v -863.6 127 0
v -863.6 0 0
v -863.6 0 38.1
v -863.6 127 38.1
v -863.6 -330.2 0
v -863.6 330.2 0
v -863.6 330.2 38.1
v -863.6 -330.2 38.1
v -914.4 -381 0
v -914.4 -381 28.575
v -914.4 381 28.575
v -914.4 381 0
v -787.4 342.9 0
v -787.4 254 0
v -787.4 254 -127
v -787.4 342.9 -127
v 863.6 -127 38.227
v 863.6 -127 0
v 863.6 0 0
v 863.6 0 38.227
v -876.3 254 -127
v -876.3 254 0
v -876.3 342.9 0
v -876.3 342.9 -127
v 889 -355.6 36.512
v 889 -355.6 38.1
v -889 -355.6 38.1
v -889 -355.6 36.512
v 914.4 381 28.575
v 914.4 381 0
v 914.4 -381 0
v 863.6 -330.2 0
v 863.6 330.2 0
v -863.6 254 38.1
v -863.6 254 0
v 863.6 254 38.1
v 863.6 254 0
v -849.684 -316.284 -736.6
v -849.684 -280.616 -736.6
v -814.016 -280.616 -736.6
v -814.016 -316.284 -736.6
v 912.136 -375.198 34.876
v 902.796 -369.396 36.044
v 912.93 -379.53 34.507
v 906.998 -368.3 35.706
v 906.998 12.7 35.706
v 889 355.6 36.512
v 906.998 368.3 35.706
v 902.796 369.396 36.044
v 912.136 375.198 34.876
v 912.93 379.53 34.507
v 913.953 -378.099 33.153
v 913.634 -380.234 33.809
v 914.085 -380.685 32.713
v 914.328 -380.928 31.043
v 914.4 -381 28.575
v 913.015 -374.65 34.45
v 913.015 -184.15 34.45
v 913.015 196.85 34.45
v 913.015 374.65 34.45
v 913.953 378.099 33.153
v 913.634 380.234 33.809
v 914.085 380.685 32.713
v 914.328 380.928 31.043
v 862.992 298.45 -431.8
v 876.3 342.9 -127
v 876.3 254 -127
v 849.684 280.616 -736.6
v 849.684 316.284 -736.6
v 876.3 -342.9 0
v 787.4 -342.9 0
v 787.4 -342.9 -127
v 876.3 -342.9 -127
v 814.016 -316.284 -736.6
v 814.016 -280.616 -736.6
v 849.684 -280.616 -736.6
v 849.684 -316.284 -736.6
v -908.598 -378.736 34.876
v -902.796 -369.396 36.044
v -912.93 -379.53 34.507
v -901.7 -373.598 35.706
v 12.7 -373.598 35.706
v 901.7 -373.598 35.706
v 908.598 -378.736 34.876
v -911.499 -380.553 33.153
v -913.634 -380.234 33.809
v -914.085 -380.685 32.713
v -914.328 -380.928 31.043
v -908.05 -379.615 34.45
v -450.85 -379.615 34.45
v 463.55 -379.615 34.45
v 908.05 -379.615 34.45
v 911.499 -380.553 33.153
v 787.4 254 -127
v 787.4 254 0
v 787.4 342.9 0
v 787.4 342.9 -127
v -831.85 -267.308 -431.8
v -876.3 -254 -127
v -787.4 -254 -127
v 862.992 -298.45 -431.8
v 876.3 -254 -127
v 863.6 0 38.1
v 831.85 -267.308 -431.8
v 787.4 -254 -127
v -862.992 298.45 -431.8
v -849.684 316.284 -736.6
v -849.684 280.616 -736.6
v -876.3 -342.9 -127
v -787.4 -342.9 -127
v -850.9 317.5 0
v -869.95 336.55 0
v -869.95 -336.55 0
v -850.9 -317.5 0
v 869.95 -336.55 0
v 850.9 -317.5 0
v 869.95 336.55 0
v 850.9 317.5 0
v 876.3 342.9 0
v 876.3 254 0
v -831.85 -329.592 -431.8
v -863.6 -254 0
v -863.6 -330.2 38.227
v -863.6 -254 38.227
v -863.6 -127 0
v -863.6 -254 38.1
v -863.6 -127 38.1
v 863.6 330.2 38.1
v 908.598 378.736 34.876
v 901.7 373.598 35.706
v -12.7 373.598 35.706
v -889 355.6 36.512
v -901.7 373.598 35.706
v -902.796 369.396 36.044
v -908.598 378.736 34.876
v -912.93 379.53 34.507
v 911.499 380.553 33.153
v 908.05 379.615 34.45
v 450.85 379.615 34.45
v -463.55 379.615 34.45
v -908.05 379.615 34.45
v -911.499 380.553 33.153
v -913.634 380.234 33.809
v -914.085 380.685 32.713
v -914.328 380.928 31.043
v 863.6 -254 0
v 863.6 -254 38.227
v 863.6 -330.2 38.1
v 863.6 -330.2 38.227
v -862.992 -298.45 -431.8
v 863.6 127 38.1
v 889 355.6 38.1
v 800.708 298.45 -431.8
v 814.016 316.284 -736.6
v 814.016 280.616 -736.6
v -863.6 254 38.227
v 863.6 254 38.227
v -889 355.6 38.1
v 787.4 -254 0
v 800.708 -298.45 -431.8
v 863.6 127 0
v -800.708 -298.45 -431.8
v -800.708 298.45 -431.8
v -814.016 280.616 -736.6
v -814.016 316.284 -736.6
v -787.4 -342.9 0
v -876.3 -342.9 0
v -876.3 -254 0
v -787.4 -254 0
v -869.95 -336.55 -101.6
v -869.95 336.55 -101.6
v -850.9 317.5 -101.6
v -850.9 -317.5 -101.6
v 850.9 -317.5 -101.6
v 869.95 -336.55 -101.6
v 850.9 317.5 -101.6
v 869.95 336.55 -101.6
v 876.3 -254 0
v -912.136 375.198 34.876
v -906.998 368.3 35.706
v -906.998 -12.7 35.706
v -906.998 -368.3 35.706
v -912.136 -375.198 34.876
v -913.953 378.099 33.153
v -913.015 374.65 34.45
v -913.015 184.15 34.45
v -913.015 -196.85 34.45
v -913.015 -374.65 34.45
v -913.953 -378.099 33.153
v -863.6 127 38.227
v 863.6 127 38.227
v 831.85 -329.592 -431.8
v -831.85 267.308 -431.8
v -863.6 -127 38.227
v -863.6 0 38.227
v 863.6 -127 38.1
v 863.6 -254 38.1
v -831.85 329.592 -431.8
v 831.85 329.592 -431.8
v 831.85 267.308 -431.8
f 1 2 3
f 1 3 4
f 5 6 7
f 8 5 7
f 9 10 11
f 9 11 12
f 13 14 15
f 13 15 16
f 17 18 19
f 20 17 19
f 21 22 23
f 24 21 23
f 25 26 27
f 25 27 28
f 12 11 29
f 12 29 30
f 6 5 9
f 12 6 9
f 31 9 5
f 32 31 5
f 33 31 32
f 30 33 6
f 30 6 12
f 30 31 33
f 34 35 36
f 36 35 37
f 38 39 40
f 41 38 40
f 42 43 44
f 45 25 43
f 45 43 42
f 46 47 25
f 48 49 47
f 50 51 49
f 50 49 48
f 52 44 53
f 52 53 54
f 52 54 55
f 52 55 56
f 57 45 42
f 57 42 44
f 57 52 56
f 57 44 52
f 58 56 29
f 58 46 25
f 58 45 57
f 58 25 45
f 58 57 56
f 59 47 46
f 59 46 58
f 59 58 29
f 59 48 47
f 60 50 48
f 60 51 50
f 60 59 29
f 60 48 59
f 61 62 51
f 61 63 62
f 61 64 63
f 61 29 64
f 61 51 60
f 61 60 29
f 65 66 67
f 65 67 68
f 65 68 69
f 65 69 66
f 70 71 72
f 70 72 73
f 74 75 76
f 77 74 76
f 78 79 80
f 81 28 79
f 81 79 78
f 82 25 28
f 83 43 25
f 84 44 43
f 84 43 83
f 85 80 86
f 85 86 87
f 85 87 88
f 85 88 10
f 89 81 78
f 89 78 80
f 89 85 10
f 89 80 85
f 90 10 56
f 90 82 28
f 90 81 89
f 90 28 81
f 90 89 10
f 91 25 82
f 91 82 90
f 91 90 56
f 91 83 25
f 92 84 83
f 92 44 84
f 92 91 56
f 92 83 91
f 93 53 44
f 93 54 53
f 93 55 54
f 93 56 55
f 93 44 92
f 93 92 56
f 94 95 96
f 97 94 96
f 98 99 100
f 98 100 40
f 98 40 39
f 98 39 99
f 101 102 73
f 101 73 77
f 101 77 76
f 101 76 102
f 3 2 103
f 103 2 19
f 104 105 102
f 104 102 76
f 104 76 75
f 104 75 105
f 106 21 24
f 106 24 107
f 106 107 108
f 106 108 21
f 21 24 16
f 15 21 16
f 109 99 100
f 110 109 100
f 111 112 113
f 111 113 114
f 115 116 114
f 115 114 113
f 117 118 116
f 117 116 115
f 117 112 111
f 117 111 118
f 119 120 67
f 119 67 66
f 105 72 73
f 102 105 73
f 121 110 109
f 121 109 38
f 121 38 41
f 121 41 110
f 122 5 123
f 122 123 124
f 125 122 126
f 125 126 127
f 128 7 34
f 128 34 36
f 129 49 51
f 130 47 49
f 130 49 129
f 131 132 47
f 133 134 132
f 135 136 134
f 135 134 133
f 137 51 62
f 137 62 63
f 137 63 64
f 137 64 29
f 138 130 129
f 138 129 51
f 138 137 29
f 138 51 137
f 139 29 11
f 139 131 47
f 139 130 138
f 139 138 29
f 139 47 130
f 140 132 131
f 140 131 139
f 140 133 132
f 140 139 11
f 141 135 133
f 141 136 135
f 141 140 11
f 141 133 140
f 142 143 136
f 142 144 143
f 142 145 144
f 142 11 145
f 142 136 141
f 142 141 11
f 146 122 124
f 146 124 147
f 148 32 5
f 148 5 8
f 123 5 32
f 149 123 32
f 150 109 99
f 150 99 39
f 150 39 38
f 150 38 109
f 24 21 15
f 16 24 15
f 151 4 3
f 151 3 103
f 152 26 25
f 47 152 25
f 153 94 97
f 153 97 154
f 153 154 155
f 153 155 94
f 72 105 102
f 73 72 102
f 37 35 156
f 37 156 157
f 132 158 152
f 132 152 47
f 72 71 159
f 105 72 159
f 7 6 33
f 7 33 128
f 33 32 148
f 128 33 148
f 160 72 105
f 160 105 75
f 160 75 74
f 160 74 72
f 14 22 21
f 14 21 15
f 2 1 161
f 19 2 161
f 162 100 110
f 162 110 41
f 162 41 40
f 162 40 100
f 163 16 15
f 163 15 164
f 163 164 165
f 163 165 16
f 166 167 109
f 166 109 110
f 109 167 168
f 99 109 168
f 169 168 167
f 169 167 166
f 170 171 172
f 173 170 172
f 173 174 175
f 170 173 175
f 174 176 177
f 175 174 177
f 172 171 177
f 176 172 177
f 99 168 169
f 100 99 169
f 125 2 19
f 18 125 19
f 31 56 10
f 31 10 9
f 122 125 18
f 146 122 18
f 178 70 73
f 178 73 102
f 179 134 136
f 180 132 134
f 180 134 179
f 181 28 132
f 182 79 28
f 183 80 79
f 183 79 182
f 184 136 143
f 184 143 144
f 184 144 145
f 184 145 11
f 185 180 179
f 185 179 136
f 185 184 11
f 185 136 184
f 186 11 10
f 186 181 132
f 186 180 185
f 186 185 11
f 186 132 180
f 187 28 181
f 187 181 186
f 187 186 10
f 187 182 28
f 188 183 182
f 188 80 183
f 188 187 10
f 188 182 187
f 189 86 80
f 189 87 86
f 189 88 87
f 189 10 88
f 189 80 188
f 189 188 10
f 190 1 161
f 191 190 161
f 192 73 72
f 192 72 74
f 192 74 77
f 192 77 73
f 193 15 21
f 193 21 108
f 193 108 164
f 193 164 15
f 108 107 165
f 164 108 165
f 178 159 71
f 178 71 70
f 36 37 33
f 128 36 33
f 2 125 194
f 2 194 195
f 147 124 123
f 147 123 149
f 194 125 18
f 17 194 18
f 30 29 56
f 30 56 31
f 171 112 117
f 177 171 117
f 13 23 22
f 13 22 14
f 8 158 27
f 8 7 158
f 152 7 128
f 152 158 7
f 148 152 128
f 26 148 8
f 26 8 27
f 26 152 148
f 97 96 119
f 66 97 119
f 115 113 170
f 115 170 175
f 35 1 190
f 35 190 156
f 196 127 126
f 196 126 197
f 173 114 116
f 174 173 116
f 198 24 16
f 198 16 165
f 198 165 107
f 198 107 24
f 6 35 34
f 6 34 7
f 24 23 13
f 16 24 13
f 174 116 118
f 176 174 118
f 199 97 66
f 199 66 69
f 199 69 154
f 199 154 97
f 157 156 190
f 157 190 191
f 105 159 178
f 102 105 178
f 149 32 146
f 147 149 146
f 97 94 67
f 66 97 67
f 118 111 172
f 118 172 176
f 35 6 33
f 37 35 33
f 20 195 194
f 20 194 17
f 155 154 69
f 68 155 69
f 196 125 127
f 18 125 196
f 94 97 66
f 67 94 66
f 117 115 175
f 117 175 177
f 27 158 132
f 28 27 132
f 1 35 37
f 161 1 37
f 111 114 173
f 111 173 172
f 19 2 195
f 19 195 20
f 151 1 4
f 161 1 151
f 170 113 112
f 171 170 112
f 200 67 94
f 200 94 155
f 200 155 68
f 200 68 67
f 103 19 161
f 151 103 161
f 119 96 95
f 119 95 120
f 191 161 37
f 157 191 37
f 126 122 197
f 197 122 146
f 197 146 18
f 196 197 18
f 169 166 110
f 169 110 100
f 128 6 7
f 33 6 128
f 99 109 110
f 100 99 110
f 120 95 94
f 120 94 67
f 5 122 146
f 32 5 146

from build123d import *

# Parameters (mm, degrees)
F0_W      = 1727.2
F0_H      = 76.2
F1_DEPTH  = 38.1
F0_H_2    = 127
F2_DEPTH  = 38.227
F5_W      = 88.9
F5_H      = 88.9
F6_DEPTH  = 127
F7_W      = 1739.9
F7_H      = 673.1
F7_W_2    = 1701.8
F7_H_2    = 635
F8_DEPTH  = 101.6
F9_W      = 88.9
F9_H      = 88.9
F10_DEPTH = 609.6
F10_TAPER = 2.5


with BuildPart() as f1:
    # F0 (on Top) → F1 (new body)
    with BuildSketch(Plane.XY):
        with Locations((0, 292.1)):
            Rectangle(F0_W, F0_H)
    extrude(amount=F1_DEPTH)


with BuildPart() as f1b:
    # F0 (on Top) → F1, piece 2 (new body)
    with BuildSketch(Plane.XY):
        with Locations((0, 63.5)):
            Rectangle(F0_W, F0_H_2)
    extrude(amount=F1_DEPTH)


with BuildPart() as f1c:
    # F0 (on Top) → F1, piece 3 (new body)
    with BuildSketch(Plane.XY):
        with Locations((0, -190.5)):
            Rectangle(F0_W, F0_H_2)
    extrude(amount=F1_DEPTH)


with BuildPart() as f2:
    # F0 (on Top) → F2 (new body)
    with BuildSketch(Plane.XY):
        with Locations((0, 190.5)):
            Rectangle(F0_W, F0_H_2)
    extrude(amount=F2_DEPTH)


with BuildPart() as f2b:
    # F0 (on Top) → F2, piece 2 (new body)
    with BuildSketch(Plane.XY):
        with Locations((0, -63.5)):
            Rectangle(F0_W, F0_H_2)
    extrude(amount=F2_DEPTH)


with BuildPart() as f2c:
    # F0 (on Top) → F2, piece 3 (new body)
    with BuildSketch(Plane.XY):
        with Locations((0, -292.1)):
            Rectangle(F0_W, F0_H)
    extrude(amount=F2_DEPTH)


with BuildPart() as f4:
    # F4: sweep along a path in F0
    with BuildLine(Plane.XY) as f4_path:
        Line((-863.6, -330.2), (863.6, -330.2))
        Line((863.6, -330.2), (863.6, 330.2))
        Line((863.6, 330.2), (-863.6, 330.2))
        Line((-863.6, 330.2), (-863.6, -330.2))
    # F3 (on Right) → F4 (sweep)
    with BuildSketch(Plane.YZ):
        with BuildLine():
            Line((-381, 0), (-330.2, 0))
            Line((-330.2, 0), (-330.2, 38.1))
            Line((-330.2, 38.1), (-355.6, 38.1))
            Line((-355.6, 38.1), (-355.6, 36.5125))
            add(Edge.make_bspline(
                [(-355.6, 36.5125), (-360.7839997933, 36.5125), (-379.2794668616, 35.9099371042), (-381, 33.9002396899), (-381, 28.575)],
                knots=[0, 0, 0, 0, 0.6304609347, 1, 1, 1, 1], degree=3))
            Line((-381, 28.575), (-381, 0))
        make_face()
    sweep(path=f4_path.line, transition=Transition.RIGHT)


with BuildPart() as f6:
    # F5 (on Top) → F6 (new body)
    with BuildSketch(Plane.XY):
        with Locations((-831.85, -298.45)):
            Rectangle(F5_W, F5_H)
    extrude(amount=-F6_DEPTH)


with BuildPart() as f6b:
    # F5 (on Top) → F6, piece 2 (new body)
    with BuildSketch(Plane.XY):
        with Locations((831.85, -298.45)):
            Rectangle(F5_W, F5_H)
    extrude(amount=-F6_DEPTH)


with BuildPart() as f6c:
    # F5 (on Top) → F6, piece 3 (new body)
    with BuildSketch(Plane.XY):
        with Locations((831.85, 298.45)):
            Rectangle(F5_W, F5_H)
    extrude(amount=-F6_DEPTH)


with BuildPart() as f6d:
    # F5 (on Top) → F6, piece 4 (new body)
    with BuildSketch(Plane.XY):
        with Locations((-831.85, 298.45)):
            Rectangle(F5_W, F5_H)
    extrude(amount=-F6_DEPTH)


with BuildPart() as f8:
    # F7 (on Top) → F8 (new body)
    with BuildSketch(Plane.XY):
        Rectangle(F7_W, F7_H)
        Rectangle(F7_W_2, F7_H_2, mode=Mode.SUBTRACT)
    extrude(amount=-F8_DEPTH)


with BuildPart() as f10:
    # F9 (on face) → F10 (new body)
    with BuildSketch(Plane(origin=(0, 0, -127), x_dir=(1, 0, 0), z_dir=(0, 0, -1))):
        with Locations((-831.85, 298.45)):
            Rectangle(F9_W, F9_H)
    extrude(amount=F10_DEPTH, taper=F10_TAPER)


with BuildPart() as f10b:
    # F9 (on face) → F10, piece 2 (new body)
    with BuildSketch(Plane(origin=(0, 0, -127), x_dir=(1, 0, 0), z_dir=(0, 0, -1))):
        with Locations((831.85, 298.45)):
            Rectangle(F9_W, F9_H)
    extrude(amount=F10_DEPTH, taper=F10_TAPER)


with BuildPart() as f10c:
    # F9 (on face) → F10, piece 3 (new body)
    with BuildSketch(Plane(origin=(0, 0, -127), x_dir=(1, 0, 0), z_dir=(0, 0, -1))):
        with Locations((831.85, -298.45)):
            Rectangle(F9_W, F9_H)
    extrude(amount=F10_DEPTH, taper=F10_TAPER)


with BuildPart() as f10d:
    # F9 (on face) → F10, piece 4 (new body)
    with BuildSketch(Plane(origin=(0, 0, -127), x_dir=(1, 0, 0), z_dir=(0, 0, -1))):
        with Locations((-831.85, -298.45)):
            Rectangle(F9_W, F9_H)
    extrude(amount=F10_DEPTH, taper=F10_TAPER)


solid = Compound([f1.part, f1b.part, f1c.part, f2.part, f2b.part, f2c.part, f4.part, f6.part, f6b.part, f6c.part, f6d.part, f8.part, f10.part, f10b.part, f10c.part, f10d.part])
